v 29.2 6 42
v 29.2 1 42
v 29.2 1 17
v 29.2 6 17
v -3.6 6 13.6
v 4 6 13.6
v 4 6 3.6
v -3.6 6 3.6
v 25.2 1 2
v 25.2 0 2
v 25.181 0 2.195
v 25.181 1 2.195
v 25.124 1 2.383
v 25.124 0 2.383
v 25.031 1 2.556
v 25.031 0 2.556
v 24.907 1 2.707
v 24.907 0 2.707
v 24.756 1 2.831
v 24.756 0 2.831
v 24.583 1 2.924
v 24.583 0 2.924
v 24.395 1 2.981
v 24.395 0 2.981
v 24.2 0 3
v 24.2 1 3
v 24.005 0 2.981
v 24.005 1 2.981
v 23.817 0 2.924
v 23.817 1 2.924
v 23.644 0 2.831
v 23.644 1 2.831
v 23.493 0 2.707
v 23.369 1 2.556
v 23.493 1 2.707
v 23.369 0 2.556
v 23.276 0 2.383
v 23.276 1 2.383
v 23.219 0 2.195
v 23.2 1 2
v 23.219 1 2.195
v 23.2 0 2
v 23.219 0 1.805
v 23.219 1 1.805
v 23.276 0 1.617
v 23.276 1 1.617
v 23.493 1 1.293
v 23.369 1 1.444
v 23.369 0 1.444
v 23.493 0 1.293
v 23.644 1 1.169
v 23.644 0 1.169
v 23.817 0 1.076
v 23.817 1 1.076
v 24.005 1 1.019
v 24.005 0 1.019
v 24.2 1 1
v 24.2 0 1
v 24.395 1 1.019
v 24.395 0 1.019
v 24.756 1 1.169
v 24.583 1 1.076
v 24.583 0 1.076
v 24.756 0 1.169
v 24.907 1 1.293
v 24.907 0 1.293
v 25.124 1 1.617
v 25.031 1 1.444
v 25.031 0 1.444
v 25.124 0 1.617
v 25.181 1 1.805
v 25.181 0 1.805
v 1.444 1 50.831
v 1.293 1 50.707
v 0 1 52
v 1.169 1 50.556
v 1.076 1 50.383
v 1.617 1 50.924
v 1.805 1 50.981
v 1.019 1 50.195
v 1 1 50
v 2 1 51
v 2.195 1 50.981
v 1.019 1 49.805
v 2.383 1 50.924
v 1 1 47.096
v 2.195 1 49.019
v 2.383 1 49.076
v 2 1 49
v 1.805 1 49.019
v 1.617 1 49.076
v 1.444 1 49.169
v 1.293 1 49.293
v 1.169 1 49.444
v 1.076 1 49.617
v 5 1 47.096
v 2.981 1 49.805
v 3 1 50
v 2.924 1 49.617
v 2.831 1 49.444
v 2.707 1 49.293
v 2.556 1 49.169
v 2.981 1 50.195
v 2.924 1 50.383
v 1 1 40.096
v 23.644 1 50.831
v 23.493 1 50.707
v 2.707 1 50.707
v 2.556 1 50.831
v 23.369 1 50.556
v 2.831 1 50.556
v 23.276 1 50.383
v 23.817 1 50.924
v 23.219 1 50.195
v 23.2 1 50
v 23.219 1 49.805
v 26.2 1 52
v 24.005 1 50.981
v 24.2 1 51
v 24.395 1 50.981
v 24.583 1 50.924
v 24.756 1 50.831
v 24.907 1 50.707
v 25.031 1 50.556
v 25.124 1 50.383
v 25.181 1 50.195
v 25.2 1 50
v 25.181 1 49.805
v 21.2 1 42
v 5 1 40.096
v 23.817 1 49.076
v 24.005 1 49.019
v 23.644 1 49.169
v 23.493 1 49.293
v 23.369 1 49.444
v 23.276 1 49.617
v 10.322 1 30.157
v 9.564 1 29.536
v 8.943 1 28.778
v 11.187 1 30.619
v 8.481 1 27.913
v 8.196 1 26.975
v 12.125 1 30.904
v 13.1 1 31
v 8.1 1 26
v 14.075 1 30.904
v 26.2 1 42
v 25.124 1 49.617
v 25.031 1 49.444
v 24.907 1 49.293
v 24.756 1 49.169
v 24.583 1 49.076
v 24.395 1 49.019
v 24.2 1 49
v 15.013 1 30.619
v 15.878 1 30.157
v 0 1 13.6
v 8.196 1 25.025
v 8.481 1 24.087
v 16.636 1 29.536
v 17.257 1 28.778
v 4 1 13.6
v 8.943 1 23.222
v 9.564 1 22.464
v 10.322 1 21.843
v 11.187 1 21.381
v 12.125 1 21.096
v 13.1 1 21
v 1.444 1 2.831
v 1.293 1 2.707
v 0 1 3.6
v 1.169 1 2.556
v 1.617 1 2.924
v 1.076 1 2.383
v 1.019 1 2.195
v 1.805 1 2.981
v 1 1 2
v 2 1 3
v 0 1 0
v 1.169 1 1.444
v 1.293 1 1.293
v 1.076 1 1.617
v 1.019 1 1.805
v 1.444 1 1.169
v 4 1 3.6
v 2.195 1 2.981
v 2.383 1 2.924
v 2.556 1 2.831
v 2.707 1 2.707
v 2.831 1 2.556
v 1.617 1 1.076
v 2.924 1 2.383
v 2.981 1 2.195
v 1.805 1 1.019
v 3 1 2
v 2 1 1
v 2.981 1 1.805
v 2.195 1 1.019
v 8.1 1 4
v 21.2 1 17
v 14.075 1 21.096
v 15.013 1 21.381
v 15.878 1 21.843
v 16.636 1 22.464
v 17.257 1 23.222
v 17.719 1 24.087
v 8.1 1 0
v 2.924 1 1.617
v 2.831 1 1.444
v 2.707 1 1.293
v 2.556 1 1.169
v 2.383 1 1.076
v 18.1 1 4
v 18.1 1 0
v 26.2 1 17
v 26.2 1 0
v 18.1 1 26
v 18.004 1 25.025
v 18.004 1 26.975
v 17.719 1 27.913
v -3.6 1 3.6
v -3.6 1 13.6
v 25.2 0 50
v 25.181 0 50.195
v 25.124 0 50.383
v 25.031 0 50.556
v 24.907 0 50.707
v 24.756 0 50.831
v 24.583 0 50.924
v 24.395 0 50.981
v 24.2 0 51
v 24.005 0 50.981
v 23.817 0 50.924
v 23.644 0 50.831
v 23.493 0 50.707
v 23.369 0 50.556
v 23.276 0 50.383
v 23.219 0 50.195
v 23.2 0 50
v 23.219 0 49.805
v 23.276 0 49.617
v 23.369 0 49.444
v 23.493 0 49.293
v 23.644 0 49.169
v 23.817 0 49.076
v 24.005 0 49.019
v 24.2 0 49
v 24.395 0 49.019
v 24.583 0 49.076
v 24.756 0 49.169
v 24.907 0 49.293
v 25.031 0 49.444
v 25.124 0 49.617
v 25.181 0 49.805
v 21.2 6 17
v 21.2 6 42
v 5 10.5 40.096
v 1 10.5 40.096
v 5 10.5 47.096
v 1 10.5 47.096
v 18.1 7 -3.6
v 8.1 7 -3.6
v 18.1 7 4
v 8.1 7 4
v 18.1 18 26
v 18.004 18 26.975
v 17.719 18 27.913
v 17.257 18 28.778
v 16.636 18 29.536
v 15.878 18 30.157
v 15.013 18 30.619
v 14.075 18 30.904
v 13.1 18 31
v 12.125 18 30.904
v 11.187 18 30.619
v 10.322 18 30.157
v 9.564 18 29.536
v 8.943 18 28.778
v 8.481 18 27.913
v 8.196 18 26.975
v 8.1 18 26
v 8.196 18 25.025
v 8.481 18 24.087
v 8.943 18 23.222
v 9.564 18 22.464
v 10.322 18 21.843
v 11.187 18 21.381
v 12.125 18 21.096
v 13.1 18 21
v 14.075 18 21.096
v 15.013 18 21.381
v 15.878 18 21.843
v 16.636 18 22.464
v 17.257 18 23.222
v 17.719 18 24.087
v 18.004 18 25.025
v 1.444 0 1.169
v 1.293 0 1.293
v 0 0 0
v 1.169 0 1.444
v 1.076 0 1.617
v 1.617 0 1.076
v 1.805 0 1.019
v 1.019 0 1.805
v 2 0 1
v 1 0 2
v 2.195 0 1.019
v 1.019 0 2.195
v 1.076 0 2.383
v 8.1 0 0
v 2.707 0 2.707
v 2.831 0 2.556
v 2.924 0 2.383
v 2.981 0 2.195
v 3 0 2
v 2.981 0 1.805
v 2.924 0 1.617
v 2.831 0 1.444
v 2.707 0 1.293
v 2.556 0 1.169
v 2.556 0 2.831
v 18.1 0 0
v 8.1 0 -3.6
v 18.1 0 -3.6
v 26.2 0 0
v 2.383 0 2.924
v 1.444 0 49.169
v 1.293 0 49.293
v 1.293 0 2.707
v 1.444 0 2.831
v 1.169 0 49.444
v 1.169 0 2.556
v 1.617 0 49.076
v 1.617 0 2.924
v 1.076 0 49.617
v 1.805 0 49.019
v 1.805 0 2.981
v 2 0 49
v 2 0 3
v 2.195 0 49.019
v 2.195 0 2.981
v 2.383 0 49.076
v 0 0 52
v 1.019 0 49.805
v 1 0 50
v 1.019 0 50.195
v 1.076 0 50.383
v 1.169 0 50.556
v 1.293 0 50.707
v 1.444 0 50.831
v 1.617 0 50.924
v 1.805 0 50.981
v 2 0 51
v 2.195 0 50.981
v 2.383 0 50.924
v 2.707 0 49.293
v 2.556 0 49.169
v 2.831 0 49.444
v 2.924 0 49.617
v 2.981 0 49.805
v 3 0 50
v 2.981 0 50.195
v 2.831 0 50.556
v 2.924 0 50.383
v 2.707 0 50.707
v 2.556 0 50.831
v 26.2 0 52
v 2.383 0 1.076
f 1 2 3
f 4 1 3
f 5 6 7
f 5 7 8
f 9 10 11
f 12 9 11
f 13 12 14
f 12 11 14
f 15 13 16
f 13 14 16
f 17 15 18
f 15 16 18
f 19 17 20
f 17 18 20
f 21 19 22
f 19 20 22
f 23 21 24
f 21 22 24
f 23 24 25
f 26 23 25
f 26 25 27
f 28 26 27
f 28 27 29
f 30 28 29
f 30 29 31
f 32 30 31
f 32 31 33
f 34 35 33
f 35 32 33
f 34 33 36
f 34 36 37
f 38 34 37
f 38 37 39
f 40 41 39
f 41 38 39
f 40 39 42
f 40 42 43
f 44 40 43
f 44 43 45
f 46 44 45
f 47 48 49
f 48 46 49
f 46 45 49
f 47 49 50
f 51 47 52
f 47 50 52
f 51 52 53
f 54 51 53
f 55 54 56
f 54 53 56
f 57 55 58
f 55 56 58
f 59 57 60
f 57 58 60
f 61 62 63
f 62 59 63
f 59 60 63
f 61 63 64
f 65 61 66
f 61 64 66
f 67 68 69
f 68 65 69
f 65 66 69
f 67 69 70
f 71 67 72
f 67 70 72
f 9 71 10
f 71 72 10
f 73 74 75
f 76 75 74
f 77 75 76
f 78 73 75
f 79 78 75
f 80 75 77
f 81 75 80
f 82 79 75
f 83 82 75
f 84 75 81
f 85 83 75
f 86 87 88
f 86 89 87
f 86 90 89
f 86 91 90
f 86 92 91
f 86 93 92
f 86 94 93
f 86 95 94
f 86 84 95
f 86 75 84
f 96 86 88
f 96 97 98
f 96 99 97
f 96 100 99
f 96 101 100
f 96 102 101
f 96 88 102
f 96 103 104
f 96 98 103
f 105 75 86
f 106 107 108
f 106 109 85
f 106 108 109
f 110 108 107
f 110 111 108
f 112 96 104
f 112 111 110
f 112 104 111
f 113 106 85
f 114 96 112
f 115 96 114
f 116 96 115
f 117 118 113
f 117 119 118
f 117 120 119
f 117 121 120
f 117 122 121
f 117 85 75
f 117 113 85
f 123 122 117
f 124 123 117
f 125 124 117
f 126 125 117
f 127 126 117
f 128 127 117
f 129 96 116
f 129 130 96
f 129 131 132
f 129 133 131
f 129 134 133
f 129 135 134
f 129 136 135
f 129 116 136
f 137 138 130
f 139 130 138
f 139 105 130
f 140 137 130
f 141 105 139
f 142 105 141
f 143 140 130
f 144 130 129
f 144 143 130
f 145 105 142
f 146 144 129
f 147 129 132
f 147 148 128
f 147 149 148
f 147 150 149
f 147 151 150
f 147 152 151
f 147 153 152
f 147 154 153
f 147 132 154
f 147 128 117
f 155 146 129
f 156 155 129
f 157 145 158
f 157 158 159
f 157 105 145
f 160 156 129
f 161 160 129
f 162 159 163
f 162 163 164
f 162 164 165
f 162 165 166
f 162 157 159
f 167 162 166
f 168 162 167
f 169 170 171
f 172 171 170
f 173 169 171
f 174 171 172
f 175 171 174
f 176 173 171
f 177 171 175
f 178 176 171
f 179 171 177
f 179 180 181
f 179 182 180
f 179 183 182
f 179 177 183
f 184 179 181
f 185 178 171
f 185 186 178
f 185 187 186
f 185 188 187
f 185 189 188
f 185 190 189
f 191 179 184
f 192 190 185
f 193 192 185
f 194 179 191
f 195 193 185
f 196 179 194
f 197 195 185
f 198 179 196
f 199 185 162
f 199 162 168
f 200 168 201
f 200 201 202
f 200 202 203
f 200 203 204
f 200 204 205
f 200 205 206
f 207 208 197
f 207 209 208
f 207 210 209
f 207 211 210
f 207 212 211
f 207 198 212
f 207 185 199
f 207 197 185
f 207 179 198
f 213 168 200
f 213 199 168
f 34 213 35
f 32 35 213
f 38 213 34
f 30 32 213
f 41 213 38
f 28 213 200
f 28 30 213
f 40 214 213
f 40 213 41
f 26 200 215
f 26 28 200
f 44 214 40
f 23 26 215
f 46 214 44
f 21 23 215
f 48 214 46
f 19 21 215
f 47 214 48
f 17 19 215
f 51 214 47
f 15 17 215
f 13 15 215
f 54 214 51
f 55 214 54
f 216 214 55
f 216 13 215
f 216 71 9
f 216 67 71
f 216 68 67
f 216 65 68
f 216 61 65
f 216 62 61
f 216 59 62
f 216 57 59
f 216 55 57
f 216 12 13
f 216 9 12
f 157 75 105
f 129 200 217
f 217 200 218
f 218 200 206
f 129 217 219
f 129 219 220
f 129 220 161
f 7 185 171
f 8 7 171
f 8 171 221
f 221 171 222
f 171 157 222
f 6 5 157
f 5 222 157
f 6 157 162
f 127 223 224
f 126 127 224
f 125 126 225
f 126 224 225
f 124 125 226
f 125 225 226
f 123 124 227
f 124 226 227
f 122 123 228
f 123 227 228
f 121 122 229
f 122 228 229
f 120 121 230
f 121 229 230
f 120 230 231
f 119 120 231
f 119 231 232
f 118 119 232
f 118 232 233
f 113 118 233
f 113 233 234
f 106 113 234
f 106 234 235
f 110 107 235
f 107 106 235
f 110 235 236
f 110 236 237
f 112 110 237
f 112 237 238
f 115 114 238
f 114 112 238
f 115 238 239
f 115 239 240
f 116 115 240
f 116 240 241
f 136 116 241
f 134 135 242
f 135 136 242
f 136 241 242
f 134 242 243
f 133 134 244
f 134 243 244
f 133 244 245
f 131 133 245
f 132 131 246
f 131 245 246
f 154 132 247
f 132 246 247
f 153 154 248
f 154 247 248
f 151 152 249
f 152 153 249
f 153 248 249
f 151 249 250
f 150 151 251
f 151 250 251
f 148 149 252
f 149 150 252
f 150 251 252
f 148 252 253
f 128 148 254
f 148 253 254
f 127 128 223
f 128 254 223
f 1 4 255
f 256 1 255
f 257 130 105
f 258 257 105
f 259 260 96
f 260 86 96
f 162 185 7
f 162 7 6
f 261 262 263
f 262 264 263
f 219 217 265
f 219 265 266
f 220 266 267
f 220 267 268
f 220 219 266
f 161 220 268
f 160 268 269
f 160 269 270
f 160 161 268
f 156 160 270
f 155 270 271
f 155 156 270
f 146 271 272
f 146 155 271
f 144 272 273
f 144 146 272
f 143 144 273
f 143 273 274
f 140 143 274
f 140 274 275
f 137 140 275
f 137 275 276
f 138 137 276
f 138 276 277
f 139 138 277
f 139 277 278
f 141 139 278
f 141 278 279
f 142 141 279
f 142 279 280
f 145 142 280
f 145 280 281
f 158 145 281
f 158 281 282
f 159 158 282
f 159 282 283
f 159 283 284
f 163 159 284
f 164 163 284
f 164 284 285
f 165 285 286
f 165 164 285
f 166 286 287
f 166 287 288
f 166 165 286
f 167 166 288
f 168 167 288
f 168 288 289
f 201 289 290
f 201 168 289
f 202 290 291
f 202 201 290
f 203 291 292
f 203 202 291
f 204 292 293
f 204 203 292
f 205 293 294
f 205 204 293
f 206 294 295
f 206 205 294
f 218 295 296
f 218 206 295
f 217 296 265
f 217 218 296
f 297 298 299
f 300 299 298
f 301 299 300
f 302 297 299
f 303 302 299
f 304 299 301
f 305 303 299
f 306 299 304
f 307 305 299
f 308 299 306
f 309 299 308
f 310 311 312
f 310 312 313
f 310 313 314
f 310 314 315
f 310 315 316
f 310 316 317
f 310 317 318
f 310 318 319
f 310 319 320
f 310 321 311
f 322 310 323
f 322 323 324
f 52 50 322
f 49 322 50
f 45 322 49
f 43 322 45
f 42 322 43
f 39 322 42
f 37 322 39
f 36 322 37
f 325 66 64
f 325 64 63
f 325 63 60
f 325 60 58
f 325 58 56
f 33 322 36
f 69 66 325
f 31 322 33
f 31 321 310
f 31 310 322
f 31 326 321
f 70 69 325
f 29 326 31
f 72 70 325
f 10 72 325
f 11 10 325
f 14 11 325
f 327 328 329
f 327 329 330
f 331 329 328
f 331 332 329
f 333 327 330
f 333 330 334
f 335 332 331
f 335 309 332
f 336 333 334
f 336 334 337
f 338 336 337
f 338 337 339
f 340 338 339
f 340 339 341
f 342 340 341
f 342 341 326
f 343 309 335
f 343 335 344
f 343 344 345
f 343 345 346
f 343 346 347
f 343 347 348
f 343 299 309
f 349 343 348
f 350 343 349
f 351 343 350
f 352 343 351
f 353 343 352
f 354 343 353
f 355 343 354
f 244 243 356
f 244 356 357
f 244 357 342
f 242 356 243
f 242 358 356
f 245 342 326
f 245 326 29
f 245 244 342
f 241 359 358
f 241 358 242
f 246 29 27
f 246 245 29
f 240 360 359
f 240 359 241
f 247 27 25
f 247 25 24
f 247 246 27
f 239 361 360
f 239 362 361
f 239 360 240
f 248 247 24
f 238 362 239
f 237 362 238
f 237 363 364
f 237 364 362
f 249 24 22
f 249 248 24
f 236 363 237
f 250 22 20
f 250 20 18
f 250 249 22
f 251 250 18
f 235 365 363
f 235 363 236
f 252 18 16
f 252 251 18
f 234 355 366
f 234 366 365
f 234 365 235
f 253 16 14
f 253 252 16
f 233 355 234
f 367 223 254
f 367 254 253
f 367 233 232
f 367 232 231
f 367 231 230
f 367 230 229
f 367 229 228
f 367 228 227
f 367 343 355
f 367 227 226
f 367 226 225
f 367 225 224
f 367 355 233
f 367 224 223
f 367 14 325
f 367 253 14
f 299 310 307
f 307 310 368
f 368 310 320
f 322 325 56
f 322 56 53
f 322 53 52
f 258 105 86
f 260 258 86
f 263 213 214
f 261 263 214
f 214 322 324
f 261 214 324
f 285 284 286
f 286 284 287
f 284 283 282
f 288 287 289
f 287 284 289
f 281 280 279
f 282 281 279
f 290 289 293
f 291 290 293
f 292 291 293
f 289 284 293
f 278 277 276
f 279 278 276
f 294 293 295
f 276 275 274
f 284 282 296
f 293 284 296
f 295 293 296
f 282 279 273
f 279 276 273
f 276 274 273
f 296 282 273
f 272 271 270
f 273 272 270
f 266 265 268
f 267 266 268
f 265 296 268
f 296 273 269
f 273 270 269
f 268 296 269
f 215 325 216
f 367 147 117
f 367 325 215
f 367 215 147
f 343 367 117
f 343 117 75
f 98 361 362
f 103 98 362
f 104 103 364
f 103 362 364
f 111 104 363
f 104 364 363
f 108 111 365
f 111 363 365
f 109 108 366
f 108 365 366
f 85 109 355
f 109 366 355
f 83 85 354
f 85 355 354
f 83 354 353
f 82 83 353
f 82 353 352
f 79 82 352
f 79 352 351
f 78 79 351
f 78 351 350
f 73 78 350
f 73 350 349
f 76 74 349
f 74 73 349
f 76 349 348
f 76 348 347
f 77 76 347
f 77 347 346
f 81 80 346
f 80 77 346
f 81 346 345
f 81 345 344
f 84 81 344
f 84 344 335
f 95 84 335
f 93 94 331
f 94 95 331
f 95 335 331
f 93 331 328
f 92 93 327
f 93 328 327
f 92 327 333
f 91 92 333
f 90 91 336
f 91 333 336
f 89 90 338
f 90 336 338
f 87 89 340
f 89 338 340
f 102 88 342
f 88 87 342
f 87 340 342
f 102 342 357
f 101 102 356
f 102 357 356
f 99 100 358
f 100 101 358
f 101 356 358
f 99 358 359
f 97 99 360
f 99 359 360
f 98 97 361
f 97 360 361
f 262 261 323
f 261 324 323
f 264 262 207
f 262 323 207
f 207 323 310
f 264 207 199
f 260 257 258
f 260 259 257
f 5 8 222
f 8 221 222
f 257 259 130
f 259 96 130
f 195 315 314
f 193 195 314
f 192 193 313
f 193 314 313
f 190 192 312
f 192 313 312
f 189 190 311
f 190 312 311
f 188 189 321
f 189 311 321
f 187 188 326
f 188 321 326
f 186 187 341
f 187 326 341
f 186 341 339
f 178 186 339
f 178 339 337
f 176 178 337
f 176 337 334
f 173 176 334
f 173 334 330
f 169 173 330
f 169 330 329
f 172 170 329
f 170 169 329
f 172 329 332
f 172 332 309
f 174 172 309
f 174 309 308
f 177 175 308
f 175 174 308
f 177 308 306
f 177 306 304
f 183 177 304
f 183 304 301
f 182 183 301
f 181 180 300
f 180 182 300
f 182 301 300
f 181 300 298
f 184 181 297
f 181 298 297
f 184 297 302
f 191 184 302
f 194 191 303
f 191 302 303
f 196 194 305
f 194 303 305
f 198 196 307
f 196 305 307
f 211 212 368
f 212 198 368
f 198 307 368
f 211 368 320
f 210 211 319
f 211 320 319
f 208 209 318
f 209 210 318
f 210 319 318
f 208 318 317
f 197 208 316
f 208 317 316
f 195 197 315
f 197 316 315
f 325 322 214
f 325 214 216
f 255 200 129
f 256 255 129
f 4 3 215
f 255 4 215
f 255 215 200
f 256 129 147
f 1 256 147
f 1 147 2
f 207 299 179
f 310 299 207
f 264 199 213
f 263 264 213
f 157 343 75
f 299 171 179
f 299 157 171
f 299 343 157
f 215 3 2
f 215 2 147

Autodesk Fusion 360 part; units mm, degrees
sketch "Sketch1" plane through (0, 0, 0) normal (0, 1, 0) x (1, 0, 0)
  line L0 (0, 0) -> (26.2, 0)
  line L1 (26.2, 0) -> (26.2, -52)
  line L2 (26.2, -52) -> (0, -52)
  line L3 (0, -52) -> (0, 0)
  circle A0 centre (2, -2) radius 1
  circle A1 centre (24.2, -2) radius 1
  line L4 (0, -26) -> (26.2, -26)
  circle A2 centre (2, -50) radius 1
  circle A3 centre (24.2, -50) radius 1
  dimension "d1" = 52
  dimension "d2" = 26.2
  dimension "d3" = 2
  dimension "d4" = 2
  dimension "d5" = 2
  dimension "d6" = 2
  dimension "d7" = 2
  dimension "d8" = 2
extrude "Extrude1" add sketch "Sketch1" along normal blind 1
sketch "Sketch2" plane through (0, 1, 0) normal (0, 1, 0) x (-1, 0, 0)
  circle A0 centre (-2, 2) radius 1
  circle A1 centre (-24.2, 2) radius 1
  circle A2 centre (-2, 50) radius 1
  circle A3 centre (-24.2, 50) radius 1
  line L0 (0, 52) -> (-26.2, 52)
  line L1 (-26.2, 52) -> (-26.2, 0)
  line L2 (-26.2, 0) -> (0, 0)
  line L3 (0, 0) -> (0, 52)
  line L4 (-1, 47.0961) -> (-5, 47.0961)
  line L5 (-5, 47.0961) -> (-5, 40.0961)
  line L6 (-5, 40.0961) -> (-1, 40.0961)
  line L7 (-1, 40.0961) -> (-1, 47.0961)
  line L8 (-21.2, 42) -> (-29.2, 42)
  line L9 (-29.2, 42) -> (-29.2, 17)
  line L10 (-29.2, 17) -> (-21.2, 17)
  line L11 (-21.2, 17) -> (-21.2, 42)
  line L12 (0, 3.6) -> (-4, 3.6)
  line L13 (-4, 3.6) -> (-4, 13.6)
  line L14 (-4, 13.6) -> (0, 13.6)
  line L15 (0, 13.6) -> (0, 3.6)
  line L16 (0, 3.6) -> (3.6, 3.6)
  line L17 (3.6, 3.6) -> (3.6, 13.6)
  line L18 (3.6, 13.6) -> (0, 13.6)
  line L19 (0, 13.6) -> (0, 3.6)
  dimension "d11" = 4
  dimension "d12" = 7
  dimension "d15" = 3
  dimension "d16" = 25
  dimension "d17" = 8
  dimension "d18" = 10
  dimension "d29" = 4
  dimension "d30" = 10
  dimension "d31" = 3.6
  dimension "d32" = 3.6
extrude "Extrude2" add sketch "Sketch2" along normal blind 9.5 contours L4 L5 L6 L7
extrude "Extrude3" add sketch "Sketch2" along normal blind 5 contours L1 L8 L10 L11 | L1 L8 L9 L10
sketch "Sketch3" plane through (0, 0, 0) normal (0, -1, 0) x (1, 0, 0)
  circle A0 centre (2, 2) radius 1
  circle A1 centre (24.2, 2) radius 1
  circle A2 centre (2, 50) radius 1
  circle A3 centre (24.2, 50) radius 1
  line L0 (26.2, 52) -> (0, 52)
  line L1 (0, 52) -> (0, 0)
  line L2 (0, 0) -> (26.2, 0)
  line L3 (26.2, 0) -> (26.2, 52)
  circle A4 centre (13.1, 26) radius 5
  line L4 (18.1, 0) -> (8.1, 0)
  line L5 (8.1, 0) -> (8.1, 4)
  line L6 (8.1, 4) -> (18.1, 4)
  line L7 (18.1, 4) -> (18.1, 0)
  line L8 (8.1, 0) -> (0, 0)
  line L9 (18.1, 0) -> (26.2, 0)
  line L10 (8.1, 0) -> (18.1, 0)
  line L11 (18.1, 0) -> (18.1, -3.6)
  line L12 (18.1, -3.6) -> (8.1, -3.6)
  line L13 (8.1, -3.6) -> (8.1, 0)
  point P0 (13.1, 26)
  dimension "d21" = 10
  dimension "d24" = 10
  dimension "d25" = 4
  dimension "d26" = 3.6
extrude "Extrude4" add sketch "Sketch3" against normal blind 18 contours A4
extrude "Extrude5" add sketch "Sketch3" against normal blind 7 contours L2 L4 L10 L11 L12 L13 | L2 L4 L5 L6 L7 L10
extrude "Extrude6" add sketch "Sketch2" along normal blind 5 contours L3 L15 L16 L17 L18 L19 | L3 L12 L13 L14 L15 L19
